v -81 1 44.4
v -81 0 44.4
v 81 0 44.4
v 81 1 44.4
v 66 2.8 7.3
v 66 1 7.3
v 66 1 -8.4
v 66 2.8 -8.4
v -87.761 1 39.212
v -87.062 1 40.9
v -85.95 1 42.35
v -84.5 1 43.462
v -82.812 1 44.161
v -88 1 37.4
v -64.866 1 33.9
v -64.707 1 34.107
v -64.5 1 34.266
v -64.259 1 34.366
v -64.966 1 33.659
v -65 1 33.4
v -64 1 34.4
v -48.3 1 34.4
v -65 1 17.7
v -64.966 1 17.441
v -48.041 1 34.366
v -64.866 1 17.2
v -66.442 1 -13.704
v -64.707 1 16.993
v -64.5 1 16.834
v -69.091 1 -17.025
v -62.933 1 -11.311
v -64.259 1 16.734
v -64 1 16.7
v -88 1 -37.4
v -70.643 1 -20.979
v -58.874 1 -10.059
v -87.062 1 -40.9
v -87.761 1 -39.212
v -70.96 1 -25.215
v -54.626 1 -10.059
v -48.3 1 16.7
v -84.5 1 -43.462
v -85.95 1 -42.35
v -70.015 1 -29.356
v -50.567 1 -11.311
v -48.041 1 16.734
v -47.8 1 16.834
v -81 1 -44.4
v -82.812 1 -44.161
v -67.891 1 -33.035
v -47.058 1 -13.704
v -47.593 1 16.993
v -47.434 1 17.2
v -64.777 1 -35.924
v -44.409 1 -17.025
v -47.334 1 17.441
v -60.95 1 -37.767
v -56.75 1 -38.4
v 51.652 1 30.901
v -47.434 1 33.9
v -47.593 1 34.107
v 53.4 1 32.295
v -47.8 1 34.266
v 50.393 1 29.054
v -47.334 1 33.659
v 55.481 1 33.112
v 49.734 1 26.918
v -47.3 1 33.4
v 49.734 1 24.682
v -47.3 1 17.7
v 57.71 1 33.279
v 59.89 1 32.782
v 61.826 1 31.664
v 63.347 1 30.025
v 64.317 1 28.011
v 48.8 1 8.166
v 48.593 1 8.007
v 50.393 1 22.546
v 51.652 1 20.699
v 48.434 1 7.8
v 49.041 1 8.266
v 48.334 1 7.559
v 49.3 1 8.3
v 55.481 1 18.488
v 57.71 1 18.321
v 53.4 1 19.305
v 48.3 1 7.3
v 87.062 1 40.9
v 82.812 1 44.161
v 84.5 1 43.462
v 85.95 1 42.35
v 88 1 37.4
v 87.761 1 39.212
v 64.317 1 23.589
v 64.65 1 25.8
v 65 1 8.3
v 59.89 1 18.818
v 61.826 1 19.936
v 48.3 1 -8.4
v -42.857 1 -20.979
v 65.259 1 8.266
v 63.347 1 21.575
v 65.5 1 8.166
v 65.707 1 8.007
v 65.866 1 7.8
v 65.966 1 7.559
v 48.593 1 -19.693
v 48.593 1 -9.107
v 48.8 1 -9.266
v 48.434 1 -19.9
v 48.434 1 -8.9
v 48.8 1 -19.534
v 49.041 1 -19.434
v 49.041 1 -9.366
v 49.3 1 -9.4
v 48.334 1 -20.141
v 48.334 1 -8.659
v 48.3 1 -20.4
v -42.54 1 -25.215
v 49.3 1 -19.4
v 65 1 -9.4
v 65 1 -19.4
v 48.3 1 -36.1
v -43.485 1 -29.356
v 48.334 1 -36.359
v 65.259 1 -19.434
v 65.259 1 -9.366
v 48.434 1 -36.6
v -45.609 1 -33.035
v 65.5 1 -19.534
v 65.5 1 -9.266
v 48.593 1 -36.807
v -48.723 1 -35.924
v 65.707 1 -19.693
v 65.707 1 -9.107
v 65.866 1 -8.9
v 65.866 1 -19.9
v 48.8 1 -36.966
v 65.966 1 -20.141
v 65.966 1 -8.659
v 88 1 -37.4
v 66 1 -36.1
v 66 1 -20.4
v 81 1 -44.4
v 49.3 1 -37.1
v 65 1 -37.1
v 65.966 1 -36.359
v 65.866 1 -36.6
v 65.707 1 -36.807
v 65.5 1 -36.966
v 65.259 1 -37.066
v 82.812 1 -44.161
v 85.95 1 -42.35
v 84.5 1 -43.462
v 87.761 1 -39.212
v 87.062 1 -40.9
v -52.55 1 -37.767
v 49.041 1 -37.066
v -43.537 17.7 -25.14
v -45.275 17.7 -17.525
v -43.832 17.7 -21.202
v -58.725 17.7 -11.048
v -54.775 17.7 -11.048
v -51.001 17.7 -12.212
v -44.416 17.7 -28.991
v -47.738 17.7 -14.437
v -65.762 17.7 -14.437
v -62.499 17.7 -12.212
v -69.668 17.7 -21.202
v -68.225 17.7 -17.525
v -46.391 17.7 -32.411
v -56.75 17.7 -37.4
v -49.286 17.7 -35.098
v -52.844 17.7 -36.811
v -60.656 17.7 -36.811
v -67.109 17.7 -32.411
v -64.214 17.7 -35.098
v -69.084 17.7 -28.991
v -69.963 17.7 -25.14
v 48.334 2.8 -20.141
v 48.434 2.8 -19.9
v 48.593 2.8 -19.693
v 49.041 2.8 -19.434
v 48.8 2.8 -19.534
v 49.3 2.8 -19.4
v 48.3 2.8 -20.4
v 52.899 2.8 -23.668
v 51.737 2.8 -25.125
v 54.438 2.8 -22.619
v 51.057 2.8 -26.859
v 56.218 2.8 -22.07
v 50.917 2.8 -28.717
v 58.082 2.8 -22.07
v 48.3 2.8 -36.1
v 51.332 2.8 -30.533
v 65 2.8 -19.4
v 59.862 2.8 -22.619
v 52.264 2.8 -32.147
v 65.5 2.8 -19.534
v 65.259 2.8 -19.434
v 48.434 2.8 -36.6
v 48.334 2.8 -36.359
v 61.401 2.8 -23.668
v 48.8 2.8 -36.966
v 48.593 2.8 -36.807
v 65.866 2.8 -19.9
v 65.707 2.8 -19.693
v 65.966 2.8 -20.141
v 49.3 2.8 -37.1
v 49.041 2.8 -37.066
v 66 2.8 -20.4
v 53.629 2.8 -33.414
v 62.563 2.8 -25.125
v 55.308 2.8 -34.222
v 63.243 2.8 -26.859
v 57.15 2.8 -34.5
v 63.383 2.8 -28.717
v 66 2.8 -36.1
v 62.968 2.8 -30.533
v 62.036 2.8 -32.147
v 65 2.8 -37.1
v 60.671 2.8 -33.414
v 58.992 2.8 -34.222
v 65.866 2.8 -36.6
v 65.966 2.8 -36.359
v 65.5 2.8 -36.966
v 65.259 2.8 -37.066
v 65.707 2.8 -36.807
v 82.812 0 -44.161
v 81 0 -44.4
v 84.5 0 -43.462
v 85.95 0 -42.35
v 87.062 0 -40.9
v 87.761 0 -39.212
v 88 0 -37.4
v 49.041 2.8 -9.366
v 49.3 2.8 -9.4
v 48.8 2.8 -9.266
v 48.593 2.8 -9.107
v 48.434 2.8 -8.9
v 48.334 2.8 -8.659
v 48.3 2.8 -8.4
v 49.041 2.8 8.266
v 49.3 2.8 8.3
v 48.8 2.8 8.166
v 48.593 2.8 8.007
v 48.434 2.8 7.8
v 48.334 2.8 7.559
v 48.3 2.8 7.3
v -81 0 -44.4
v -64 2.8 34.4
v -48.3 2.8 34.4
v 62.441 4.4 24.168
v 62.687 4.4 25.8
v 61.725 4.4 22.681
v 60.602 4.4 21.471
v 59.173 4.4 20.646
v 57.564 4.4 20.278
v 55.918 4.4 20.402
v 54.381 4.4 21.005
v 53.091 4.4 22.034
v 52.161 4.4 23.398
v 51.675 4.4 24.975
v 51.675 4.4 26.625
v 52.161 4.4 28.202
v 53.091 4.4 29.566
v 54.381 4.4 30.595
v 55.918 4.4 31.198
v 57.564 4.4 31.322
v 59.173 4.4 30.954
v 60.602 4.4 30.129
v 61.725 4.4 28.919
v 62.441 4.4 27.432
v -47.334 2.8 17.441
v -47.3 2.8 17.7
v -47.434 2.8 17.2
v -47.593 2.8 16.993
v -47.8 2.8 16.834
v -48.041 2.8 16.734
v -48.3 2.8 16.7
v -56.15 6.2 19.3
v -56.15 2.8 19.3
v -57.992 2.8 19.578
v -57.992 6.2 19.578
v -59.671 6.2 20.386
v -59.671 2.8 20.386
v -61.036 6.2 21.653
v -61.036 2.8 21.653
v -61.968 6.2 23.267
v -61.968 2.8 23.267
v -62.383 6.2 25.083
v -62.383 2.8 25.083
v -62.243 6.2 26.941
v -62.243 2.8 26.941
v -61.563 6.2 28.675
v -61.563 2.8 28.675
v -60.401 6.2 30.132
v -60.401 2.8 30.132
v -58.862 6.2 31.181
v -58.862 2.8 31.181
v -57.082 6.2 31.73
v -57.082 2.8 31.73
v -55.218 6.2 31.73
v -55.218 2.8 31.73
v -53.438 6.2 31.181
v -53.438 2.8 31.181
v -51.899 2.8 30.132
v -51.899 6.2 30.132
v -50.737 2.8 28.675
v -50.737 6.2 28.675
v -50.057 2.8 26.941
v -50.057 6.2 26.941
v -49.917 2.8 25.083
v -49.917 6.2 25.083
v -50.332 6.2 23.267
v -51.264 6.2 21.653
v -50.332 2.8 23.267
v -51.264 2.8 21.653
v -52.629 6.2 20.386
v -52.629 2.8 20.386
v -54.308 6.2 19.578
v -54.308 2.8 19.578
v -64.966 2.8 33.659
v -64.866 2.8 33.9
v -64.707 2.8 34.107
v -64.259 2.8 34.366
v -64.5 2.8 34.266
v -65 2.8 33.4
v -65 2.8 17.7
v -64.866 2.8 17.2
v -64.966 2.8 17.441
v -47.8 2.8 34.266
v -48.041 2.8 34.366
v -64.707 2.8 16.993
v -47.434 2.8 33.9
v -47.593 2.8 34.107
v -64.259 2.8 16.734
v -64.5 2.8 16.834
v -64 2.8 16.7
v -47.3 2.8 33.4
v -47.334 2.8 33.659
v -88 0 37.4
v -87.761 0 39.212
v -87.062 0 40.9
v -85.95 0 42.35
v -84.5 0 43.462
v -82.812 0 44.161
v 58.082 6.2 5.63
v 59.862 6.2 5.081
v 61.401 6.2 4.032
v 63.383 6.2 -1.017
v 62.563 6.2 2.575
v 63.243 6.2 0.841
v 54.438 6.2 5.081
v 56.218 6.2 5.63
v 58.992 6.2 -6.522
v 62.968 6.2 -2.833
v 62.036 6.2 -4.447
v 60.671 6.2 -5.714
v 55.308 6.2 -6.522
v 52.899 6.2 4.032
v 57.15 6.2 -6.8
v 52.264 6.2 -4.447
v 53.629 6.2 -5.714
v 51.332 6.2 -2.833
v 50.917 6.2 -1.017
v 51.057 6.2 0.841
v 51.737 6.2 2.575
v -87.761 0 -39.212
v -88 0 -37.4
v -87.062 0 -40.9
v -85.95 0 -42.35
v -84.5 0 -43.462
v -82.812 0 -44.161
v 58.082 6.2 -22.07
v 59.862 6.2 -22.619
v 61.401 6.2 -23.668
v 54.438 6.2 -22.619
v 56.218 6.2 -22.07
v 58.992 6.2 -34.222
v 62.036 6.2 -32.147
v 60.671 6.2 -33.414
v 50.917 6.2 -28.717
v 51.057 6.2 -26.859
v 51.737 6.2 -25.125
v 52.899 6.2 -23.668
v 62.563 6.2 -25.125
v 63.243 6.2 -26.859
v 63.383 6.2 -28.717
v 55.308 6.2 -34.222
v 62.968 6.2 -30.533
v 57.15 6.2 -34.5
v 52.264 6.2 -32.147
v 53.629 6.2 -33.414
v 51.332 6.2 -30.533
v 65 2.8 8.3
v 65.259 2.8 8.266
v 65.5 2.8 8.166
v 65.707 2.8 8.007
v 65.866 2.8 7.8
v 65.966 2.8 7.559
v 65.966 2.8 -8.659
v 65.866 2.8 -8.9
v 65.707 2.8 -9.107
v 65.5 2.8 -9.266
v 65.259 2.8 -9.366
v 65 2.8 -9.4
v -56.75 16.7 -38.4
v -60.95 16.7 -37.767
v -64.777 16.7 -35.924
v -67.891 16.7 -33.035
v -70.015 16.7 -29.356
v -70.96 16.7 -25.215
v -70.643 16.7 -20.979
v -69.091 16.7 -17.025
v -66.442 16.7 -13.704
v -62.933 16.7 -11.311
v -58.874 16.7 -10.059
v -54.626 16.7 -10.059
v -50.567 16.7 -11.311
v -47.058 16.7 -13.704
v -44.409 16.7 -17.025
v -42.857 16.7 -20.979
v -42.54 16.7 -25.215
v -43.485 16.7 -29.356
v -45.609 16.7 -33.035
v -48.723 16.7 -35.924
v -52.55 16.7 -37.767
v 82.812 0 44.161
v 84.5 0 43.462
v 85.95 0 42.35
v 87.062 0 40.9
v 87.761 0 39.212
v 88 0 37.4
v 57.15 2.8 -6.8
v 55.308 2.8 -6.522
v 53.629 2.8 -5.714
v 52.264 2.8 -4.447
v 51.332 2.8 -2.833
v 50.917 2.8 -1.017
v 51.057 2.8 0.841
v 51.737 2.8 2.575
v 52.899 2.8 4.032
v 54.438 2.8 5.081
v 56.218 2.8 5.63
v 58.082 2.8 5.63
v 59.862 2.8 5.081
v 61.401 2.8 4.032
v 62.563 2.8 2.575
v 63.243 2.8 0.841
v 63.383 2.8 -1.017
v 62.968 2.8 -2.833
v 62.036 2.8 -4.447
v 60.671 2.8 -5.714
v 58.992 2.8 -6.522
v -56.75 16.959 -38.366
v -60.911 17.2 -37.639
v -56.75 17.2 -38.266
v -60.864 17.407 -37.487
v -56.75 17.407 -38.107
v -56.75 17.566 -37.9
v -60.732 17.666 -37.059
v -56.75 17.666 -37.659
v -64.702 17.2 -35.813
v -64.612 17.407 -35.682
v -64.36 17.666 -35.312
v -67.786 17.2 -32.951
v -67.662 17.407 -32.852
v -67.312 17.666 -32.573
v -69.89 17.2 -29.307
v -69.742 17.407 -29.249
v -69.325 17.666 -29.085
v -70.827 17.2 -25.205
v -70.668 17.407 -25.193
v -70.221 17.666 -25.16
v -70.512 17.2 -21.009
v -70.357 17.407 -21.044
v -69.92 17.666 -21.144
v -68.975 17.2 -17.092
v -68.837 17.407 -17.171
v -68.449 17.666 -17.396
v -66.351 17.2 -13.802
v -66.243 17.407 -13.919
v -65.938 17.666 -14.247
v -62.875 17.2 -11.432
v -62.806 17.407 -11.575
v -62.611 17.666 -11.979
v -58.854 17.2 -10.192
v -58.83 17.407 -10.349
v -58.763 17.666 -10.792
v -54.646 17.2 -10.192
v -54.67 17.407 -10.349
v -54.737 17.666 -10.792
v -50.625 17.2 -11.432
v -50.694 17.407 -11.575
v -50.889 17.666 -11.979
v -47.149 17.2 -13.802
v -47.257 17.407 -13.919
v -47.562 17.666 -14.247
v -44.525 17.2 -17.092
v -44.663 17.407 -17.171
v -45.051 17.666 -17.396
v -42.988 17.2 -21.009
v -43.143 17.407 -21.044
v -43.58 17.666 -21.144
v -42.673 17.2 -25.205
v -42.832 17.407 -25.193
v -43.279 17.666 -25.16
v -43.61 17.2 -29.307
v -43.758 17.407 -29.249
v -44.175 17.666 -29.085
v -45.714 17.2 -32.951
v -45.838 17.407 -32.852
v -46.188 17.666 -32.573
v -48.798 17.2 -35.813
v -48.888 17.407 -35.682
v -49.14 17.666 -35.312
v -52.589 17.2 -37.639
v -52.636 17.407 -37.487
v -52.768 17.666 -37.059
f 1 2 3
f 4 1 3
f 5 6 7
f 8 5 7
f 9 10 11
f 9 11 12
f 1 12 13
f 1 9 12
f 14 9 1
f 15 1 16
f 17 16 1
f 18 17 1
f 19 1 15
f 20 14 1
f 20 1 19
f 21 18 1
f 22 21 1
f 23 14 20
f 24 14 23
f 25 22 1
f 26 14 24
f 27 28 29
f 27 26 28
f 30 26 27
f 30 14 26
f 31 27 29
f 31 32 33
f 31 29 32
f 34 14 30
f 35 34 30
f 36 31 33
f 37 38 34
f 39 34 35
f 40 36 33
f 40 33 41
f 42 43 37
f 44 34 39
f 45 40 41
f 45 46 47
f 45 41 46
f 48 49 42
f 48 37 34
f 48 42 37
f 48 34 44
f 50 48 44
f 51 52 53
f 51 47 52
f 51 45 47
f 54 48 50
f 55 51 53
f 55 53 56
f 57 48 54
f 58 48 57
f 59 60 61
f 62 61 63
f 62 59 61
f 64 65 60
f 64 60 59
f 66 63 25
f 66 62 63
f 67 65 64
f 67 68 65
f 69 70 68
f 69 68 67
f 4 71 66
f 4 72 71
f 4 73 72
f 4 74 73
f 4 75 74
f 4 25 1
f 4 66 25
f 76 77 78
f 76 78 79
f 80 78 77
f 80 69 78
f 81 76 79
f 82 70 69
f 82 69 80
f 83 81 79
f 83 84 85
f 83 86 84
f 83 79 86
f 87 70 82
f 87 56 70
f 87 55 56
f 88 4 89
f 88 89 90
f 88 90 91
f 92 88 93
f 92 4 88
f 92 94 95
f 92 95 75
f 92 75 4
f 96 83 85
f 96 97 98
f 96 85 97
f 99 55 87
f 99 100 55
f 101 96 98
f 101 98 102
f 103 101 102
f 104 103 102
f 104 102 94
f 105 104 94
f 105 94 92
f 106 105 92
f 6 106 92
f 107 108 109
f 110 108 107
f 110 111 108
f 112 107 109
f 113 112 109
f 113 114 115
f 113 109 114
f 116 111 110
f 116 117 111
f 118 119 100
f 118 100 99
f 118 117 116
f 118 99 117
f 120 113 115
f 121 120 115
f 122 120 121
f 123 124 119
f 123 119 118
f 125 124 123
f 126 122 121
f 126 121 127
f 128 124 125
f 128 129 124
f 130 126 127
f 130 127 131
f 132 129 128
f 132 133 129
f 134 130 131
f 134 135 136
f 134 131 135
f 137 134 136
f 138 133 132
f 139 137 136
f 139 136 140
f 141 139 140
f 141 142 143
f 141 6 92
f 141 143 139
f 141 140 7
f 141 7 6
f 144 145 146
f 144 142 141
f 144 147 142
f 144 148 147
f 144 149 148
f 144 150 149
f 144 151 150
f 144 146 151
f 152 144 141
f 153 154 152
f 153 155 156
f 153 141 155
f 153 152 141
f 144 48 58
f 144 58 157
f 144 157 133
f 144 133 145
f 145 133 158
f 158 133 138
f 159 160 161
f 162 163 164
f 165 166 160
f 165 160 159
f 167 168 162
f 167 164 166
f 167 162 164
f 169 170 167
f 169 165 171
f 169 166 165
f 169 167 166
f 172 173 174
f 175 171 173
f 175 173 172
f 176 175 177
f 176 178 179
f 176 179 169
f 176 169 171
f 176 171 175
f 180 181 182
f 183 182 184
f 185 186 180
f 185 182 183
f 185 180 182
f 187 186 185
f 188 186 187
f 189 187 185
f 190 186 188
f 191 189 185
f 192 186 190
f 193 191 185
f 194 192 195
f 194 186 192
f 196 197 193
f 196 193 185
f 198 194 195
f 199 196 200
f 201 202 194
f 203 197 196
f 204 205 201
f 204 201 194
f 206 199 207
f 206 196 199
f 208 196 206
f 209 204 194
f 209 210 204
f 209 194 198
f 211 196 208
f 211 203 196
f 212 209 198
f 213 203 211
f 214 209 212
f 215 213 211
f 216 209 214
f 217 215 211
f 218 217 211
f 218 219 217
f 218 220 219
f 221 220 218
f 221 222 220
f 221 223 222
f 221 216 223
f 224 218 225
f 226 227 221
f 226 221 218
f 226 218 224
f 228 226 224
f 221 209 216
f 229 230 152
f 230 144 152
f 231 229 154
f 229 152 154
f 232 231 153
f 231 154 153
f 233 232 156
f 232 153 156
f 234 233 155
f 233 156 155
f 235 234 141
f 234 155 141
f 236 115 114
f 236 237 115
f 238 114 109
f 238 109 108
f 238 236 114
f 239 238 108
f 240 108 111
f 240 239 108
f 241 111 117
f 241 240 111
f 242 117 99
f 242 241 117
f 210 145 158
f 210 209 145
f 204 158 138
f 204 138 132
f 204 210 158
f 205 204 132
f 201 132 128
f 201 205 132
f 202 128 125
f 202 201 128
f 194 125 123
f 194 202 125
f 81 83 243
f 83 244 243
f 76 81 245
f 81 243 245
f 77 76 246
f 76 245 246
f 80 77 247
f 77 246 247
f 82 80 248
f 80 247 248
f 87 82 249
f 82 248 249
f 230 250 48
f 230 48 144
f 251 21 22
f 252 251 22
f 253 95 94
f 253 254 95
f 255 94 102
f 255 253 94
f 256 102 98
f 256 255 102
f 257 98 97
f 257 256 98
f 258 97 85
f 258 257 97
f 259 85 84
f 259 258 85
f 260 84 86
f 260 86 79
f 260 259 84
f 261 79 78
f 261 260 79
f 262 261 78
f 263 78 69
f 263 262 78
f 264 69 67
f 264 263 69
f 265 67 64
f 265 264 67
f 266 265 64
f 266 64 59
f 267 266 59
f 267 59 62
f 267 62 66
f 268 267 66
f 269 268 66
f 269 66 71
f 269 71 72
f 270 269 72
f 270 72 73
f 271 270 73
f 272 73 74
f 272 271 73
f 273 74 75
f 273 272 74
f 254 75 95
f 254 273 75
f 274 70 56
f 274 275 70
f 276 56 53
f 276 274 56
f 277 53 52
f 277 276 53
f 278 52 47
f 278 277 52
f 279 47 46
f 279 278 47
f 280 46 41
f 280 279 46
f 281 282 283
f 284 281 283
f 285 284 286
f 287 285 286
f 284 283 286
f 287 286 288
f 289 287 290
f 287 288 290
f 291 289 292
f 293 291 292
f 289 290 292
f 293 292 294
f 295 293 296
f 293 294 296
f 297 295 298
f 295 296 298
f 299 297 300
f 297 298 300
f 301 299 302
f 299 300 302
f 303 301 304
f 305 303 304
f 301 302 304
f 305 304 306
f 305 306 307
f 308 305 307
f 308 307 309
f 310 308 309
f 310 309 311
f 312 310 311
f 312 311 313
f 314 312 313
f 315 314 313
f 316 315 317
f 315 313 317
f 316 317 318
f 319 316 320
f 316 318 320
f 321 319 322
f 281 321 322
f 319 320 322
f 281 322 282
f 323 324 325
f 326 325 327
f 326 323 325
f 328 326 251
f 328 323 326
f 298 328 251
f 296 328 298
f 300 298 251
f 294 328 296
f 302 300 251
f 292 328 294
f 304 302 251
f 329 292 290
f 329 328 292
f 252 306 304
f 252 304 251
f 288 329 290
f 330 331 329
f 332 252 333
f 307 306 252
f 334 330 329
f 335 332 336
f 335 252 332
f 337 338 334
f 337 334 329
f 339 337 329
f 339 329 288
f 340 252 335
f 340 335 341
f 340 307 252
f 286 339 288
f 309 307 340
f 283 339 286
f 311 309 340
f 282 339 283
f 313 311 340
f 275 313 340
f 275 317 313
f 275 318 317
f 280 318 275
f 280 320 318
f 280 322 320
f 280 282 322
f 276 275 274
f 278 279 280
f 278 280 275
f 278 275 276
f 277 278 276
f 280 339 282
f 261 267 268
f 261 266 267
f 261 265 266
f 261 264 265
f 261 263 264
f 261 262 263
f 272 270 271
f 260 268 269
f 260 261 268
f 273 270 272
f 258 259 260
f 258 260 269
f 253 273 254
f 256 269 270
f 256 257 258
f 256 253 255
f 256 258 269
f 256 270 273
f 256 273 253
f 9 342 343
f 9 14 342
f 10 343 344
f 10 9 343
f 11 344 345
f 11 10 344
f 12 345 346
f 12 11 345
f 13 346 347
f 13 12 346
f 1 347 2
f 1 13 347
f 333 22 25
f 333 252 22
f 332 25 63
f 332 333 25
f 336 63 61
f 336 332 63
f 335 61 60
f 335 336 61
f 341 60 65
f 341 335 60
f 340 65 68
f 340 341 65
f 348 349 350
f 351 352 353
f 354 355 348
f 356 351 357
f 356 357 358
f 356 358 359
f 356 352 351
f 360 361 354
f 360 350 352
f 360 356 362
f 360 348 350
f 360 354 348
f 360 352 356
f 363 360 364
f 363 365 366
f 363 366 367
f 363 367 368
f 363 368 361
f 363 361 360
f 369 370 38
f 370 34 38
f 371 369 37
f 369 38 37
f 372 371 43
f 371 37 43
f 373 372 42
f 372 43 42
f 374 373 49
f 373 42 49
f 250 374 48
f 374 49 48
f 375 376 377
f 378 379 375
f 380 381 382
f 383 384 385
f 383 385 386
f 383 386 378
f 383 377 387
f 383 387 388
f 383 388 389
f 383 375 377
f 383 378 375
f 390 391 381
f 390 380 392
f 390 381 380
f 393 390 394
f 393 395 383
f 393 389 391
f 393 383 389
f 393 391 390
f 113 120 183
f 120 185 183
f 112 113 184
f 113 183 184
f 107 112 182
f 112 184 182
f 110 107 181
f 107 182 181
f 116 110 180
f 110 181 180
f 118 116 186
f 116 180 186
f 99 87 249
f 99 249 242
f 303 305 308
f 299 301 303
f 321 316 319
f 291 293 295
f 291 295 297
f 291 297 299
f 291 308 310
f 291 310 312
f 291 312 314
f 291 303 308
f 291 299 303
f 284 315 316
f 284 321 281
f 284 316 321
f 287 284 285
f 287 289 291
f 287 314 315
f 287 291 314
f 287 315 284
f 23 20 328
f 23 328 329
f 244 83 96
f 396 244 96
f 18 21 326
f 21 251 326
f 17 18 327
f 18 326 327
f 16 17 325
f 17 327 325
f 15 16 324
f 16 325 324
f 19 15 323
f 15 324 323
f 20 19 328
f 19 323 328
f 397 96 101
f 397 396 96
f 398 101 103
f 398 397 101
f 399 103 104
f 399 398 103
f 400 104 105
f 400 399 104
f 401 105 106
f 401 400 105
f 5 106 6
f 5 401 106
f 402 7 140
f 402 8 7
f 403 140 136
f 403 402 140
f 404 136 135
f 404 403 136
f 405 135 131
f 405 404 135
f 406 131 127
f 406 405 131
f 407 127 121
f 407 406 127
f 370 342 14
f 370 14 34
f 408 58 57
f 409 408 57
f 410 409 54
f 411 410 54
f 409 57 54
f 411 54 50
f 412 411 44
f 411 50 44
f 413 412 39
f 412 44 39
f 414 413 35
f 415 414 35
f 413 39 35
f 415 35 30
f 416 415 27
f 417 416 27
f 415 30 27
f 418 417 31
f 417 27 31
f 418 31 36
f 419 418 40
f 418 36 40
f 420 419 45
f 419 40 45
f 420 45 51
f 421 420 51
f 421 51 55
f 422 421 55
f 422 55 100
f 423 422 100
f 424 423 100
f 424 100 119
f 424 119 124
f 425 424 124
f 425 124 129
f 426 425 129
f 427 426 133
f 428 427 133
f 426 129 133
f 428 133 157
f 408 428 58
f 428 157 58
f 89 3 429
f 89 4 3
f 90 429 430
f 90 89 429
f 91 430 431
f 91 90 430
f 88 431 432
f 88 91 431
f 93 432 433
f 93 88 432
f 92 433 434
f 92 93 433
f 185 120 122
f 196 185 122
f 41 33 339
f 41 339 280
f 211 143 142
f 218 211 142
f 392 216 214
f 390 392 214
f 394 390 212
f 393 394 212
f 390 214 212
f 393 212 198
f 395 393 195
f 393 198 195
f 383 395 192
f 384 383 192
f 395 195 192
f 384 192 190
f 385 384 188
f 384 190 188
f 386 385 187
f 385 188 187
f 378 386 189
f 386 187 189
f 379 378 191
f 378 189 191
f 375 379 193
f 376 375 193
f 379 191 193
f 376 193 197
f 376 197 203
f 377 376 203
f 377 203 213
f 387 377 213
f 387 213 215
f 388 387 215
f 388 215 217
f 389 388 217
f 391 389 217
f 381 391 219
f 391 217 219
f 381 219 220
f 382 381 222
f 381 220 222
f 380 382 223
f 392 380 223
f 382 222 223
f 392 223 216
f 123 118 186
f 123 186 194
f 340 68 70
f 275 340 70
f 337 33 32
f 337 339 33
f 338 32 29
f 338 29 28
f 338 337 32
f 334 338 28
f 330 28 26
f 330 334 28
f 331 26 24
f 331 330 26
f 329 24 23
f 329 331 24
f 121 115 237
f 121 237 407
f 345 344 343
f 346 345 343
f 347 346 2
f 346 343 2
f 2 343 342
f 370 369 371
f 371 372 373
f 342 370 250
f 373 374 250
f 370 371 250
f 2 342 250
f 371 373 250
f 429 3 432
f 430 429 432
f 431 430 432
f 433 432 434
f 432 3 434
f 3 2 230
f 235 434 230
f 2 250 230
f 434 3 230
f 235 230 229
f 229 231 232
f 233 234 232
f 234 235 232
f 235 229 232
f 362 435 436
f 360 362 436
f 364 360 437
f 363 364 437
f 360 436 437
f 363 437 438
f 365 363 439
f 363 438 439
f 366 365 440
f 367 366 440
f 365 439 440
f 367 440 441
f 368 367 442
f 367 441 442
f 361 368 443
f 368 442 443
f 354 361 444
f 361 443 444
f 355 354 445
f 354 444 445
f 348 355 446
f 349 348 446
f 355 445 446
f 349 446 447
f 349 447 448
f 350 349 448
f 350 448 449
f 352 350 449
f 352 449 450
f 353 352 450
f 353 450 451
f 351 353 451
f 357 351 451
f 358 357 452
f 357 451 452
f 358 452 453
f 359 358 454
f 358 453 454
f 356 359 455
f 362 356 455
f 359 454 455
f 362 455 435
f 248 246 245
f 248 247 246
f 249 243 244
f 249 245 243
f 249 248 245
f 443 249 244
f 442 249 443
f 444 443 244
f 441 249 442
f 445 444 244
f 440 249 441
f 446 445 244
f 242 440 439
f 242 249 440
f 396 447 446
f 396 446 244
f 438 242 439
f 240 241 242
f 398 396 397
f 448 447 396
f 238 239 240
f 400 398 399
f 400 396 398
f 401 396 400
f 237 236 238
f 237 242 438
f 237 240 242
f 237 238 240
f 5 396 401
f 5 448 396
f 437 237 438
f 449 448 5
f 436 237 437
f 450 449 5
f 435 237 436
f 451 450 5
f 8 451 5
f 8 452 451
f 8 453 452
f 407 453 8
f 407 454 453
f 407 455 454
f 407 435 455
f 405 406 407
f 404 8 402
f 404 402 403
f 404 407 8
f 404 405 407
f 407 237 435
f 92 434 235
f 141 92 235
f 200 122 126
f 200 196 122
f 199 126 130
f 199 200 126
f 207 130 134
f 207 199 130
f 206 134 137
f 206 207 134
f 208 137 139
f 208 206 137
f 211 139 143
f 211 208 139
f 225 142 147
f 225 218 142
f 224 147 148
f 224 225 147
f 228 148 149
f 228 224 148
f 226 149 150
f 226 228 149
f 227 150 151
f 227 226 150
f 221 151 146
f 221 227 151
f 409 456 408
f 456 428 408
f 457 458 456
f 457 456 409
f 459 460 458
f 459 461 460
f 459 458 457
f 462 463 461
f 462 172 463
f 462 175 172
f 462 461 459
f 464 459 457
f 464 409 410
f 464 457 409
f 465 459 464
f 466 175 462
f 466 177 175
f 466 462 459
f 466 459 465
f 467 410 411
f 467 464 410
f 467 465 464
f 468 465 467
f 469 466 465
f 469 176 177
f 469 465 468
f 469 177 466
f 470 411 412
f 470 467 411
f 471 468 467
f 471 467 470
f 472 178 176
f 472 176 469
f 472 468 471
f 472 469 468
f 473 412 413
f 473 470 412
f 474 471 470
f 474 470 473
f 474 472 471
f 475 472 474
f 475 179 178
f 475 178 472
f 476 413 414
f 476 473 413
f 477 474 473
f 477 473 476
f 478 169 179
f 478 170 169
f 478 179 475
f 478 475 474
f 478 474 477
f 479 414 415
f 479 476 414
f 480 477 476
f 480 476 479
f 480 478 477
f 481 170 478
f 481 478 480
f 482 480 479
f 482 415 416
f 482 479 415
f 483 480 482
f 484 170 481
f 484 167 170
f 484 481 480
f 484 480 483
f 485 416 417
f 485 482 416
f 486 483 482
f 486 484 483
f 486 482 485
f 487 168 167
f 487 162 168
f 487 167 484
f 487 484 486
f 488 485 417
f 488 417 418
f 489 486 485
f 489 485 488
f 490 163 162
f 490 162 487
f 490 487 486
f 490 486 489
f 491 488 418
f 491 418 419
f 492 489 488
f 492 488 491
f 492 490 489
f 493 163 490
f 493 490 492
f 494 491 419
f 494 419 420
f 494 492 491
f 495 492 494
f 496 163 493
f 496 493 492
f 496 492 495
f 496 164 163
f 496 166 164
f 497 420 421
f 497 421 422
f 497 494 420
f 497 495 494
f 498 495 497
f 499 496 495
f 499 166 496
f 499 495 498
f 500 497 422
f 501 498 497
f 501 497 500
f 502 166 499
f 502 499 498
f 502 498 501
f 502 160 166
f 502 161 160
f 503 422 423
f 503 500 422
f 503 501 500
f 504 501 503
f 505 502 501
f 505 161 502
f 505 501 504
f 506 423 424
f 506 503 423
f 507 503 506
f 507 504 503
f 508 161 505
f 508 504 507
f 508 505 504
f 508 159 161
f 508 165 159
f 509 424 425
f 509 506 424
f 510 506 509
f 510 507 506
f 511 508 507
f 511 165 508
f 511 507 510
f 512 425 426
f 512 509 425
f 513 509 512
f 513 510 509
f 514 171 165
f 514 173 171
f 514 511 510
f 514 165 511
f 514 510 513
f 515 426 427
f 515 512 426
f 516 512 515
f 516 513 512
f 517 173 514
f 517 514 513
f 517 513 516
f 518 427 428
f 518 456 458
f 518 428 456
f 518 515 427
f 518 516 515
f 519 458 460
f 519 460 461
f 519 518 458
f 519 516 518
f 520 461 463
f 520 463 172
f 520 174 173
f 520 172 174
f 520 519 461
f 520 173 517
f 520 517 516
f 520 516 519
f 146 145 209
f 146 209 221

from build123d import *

# Parameters (mm, degrees)
SKETCH1_W           = 176
SKETCH1_H           = 88.8
BOSS_EXTRUDE1_DEPTH = 1
SKETCH2_R           = 14.25
BOSS_EXTRUDE2_DEPTH = 16.7
FILLET1_R           = 1
SKETCH3_W           = 17.7
SKETCH3_H           = 17.7
BOSS_EXTRUDE3_DEPTH = 1.8
FILLET2_R           = 1
FILLET3_R           = 7
SKETCH4_R           = 6.25
BOSS_EXTRUDE4_DEPTH = 3.4
SKETCH7_R           = 7.5
BOSS_EXTRUDE5_DEPTH = 3.4
BOSS_EXTRUDE5_TAPER = 30


with BuildPart() as part:
    # Sketch1 → Boss-Extrude1 (new body)
    with BuildSketch(Plane(origin=(0, 0, 0), x_dir=(1, 0, 0), z_dir=(0, 1, 0))):
        Rectangle(SKETCH1_W, SKETCH1_H)
    extrude(amount=BOSS_EXTRUDE1_DEPTH)

    # Sketch2 → Boss-Extrude2 (add)
    with BuildSketch(Plane(origin=(0, 1, 0), x_dir=(1, 0, 0), z_dir=(0, 1, 0))):
        with Locations(Location((-56.75, 24.15, 0), (0, 0, 90))):
            Circle(SKETCH2_R)
    extrude(amount=BOSS_EXTRUDE2_DEPTH)

    # Fillet1
    fillet1_edges = [part.edges().sort_by_distance(p)[0] for p in [
        (-56.75, 17.7, -9.9),
    ]]
    fillet(fillet1_edges, radius=FILLET1_R)

    # Sketch3 → Boss-Extrude3 (add)
    with BuildSketch(Plane(origin=(0, 1, 0), x_dir=(1, 0, 0), z_dir=(0, 1, 0))):
        with Locations((-56.15, -25.55)):
            Rectangle(SKETCH3_W, SKETCH3_H)
        with Locations((57.15, 28.25)):
            Rectangle(SKETCH3_W, SKETCH3_H)
        with Locations((57.15, 0.55)):
            Rectangle(SKETCH3_W, SKETCH3_H)
    extrude(amount=BOSS_EXTRUDE3_DEPTH)

    # Fillet2
    fillet2_edges = [part.edges().sort_by_distance(p)[0] for p in [
        (-47.3, 1.9, 34.4),
        (-47.3, 1.9, 16.7),
        (-65, 1.9, 16.7),
        (-65, 1.9, 34.4),
        (66, 1.9, -19.4),
        (66, 1.9, -37.1),
        (48.3, 1.9, -37.1),
        (48.3, 1.9, -19.4),
        (66, 1.9, 8.3),
        (66, 1.9, -9.4),
        (48.3, 1.9, -9.4),
        (48.3, 1.9, 8.3),
    ]]
    fillet(fillet2_edges, radius=FILLET2_R)

    # Fillet3
    fillet3_edges = [part.edges().sort_by_distance(p)[0] for p in [
        (88, 0.5, 44.4),
        (-88, 0.5, 44.4),
        (-88, 0.5, -44.4),
        (88, 0.5, -44.4),
    ]]
    fillet(fillet3_edges, radius=FILLET3_R)

    # Sketch4 → Boss-Extrude4 (add)
    with BuildSketch(Plane(origin=(0, 2.8, 0), x_dir=(1, 0, 0), z_dir=(0, 1, 0))):
        with Locations(Location((-56.15, -25.55, 0), (0, 0, 90))):
            Circle(SKETCH4_R)
        with Locations(Location((57.15, 28.25, 0), (0, 0, 90))):
            Circle(SKETCH4_R)
        with Locations(Location((57.15, 0.55, 0), (0, 0, 90))):
            Circle(SKETCH4_R)
    extrude(amount=BOSS_EXTRUDE4_DEPTH)

    # Sketch7 → Boss-Extrude5 (add)
    with BuildSketch(Plane(origin=(0, 1, 0), x_dir=(1, 0, 0), z_dir=(0, 1, 0))):
        with Locations((57.15, -25.8)):
            Circle(SKETCH7_R)
    extrude(amount=BOSS_EXTRUDE5_DEPTH, taper=BOSS_EXTRUDE5_TAPER)


solid = part.part
